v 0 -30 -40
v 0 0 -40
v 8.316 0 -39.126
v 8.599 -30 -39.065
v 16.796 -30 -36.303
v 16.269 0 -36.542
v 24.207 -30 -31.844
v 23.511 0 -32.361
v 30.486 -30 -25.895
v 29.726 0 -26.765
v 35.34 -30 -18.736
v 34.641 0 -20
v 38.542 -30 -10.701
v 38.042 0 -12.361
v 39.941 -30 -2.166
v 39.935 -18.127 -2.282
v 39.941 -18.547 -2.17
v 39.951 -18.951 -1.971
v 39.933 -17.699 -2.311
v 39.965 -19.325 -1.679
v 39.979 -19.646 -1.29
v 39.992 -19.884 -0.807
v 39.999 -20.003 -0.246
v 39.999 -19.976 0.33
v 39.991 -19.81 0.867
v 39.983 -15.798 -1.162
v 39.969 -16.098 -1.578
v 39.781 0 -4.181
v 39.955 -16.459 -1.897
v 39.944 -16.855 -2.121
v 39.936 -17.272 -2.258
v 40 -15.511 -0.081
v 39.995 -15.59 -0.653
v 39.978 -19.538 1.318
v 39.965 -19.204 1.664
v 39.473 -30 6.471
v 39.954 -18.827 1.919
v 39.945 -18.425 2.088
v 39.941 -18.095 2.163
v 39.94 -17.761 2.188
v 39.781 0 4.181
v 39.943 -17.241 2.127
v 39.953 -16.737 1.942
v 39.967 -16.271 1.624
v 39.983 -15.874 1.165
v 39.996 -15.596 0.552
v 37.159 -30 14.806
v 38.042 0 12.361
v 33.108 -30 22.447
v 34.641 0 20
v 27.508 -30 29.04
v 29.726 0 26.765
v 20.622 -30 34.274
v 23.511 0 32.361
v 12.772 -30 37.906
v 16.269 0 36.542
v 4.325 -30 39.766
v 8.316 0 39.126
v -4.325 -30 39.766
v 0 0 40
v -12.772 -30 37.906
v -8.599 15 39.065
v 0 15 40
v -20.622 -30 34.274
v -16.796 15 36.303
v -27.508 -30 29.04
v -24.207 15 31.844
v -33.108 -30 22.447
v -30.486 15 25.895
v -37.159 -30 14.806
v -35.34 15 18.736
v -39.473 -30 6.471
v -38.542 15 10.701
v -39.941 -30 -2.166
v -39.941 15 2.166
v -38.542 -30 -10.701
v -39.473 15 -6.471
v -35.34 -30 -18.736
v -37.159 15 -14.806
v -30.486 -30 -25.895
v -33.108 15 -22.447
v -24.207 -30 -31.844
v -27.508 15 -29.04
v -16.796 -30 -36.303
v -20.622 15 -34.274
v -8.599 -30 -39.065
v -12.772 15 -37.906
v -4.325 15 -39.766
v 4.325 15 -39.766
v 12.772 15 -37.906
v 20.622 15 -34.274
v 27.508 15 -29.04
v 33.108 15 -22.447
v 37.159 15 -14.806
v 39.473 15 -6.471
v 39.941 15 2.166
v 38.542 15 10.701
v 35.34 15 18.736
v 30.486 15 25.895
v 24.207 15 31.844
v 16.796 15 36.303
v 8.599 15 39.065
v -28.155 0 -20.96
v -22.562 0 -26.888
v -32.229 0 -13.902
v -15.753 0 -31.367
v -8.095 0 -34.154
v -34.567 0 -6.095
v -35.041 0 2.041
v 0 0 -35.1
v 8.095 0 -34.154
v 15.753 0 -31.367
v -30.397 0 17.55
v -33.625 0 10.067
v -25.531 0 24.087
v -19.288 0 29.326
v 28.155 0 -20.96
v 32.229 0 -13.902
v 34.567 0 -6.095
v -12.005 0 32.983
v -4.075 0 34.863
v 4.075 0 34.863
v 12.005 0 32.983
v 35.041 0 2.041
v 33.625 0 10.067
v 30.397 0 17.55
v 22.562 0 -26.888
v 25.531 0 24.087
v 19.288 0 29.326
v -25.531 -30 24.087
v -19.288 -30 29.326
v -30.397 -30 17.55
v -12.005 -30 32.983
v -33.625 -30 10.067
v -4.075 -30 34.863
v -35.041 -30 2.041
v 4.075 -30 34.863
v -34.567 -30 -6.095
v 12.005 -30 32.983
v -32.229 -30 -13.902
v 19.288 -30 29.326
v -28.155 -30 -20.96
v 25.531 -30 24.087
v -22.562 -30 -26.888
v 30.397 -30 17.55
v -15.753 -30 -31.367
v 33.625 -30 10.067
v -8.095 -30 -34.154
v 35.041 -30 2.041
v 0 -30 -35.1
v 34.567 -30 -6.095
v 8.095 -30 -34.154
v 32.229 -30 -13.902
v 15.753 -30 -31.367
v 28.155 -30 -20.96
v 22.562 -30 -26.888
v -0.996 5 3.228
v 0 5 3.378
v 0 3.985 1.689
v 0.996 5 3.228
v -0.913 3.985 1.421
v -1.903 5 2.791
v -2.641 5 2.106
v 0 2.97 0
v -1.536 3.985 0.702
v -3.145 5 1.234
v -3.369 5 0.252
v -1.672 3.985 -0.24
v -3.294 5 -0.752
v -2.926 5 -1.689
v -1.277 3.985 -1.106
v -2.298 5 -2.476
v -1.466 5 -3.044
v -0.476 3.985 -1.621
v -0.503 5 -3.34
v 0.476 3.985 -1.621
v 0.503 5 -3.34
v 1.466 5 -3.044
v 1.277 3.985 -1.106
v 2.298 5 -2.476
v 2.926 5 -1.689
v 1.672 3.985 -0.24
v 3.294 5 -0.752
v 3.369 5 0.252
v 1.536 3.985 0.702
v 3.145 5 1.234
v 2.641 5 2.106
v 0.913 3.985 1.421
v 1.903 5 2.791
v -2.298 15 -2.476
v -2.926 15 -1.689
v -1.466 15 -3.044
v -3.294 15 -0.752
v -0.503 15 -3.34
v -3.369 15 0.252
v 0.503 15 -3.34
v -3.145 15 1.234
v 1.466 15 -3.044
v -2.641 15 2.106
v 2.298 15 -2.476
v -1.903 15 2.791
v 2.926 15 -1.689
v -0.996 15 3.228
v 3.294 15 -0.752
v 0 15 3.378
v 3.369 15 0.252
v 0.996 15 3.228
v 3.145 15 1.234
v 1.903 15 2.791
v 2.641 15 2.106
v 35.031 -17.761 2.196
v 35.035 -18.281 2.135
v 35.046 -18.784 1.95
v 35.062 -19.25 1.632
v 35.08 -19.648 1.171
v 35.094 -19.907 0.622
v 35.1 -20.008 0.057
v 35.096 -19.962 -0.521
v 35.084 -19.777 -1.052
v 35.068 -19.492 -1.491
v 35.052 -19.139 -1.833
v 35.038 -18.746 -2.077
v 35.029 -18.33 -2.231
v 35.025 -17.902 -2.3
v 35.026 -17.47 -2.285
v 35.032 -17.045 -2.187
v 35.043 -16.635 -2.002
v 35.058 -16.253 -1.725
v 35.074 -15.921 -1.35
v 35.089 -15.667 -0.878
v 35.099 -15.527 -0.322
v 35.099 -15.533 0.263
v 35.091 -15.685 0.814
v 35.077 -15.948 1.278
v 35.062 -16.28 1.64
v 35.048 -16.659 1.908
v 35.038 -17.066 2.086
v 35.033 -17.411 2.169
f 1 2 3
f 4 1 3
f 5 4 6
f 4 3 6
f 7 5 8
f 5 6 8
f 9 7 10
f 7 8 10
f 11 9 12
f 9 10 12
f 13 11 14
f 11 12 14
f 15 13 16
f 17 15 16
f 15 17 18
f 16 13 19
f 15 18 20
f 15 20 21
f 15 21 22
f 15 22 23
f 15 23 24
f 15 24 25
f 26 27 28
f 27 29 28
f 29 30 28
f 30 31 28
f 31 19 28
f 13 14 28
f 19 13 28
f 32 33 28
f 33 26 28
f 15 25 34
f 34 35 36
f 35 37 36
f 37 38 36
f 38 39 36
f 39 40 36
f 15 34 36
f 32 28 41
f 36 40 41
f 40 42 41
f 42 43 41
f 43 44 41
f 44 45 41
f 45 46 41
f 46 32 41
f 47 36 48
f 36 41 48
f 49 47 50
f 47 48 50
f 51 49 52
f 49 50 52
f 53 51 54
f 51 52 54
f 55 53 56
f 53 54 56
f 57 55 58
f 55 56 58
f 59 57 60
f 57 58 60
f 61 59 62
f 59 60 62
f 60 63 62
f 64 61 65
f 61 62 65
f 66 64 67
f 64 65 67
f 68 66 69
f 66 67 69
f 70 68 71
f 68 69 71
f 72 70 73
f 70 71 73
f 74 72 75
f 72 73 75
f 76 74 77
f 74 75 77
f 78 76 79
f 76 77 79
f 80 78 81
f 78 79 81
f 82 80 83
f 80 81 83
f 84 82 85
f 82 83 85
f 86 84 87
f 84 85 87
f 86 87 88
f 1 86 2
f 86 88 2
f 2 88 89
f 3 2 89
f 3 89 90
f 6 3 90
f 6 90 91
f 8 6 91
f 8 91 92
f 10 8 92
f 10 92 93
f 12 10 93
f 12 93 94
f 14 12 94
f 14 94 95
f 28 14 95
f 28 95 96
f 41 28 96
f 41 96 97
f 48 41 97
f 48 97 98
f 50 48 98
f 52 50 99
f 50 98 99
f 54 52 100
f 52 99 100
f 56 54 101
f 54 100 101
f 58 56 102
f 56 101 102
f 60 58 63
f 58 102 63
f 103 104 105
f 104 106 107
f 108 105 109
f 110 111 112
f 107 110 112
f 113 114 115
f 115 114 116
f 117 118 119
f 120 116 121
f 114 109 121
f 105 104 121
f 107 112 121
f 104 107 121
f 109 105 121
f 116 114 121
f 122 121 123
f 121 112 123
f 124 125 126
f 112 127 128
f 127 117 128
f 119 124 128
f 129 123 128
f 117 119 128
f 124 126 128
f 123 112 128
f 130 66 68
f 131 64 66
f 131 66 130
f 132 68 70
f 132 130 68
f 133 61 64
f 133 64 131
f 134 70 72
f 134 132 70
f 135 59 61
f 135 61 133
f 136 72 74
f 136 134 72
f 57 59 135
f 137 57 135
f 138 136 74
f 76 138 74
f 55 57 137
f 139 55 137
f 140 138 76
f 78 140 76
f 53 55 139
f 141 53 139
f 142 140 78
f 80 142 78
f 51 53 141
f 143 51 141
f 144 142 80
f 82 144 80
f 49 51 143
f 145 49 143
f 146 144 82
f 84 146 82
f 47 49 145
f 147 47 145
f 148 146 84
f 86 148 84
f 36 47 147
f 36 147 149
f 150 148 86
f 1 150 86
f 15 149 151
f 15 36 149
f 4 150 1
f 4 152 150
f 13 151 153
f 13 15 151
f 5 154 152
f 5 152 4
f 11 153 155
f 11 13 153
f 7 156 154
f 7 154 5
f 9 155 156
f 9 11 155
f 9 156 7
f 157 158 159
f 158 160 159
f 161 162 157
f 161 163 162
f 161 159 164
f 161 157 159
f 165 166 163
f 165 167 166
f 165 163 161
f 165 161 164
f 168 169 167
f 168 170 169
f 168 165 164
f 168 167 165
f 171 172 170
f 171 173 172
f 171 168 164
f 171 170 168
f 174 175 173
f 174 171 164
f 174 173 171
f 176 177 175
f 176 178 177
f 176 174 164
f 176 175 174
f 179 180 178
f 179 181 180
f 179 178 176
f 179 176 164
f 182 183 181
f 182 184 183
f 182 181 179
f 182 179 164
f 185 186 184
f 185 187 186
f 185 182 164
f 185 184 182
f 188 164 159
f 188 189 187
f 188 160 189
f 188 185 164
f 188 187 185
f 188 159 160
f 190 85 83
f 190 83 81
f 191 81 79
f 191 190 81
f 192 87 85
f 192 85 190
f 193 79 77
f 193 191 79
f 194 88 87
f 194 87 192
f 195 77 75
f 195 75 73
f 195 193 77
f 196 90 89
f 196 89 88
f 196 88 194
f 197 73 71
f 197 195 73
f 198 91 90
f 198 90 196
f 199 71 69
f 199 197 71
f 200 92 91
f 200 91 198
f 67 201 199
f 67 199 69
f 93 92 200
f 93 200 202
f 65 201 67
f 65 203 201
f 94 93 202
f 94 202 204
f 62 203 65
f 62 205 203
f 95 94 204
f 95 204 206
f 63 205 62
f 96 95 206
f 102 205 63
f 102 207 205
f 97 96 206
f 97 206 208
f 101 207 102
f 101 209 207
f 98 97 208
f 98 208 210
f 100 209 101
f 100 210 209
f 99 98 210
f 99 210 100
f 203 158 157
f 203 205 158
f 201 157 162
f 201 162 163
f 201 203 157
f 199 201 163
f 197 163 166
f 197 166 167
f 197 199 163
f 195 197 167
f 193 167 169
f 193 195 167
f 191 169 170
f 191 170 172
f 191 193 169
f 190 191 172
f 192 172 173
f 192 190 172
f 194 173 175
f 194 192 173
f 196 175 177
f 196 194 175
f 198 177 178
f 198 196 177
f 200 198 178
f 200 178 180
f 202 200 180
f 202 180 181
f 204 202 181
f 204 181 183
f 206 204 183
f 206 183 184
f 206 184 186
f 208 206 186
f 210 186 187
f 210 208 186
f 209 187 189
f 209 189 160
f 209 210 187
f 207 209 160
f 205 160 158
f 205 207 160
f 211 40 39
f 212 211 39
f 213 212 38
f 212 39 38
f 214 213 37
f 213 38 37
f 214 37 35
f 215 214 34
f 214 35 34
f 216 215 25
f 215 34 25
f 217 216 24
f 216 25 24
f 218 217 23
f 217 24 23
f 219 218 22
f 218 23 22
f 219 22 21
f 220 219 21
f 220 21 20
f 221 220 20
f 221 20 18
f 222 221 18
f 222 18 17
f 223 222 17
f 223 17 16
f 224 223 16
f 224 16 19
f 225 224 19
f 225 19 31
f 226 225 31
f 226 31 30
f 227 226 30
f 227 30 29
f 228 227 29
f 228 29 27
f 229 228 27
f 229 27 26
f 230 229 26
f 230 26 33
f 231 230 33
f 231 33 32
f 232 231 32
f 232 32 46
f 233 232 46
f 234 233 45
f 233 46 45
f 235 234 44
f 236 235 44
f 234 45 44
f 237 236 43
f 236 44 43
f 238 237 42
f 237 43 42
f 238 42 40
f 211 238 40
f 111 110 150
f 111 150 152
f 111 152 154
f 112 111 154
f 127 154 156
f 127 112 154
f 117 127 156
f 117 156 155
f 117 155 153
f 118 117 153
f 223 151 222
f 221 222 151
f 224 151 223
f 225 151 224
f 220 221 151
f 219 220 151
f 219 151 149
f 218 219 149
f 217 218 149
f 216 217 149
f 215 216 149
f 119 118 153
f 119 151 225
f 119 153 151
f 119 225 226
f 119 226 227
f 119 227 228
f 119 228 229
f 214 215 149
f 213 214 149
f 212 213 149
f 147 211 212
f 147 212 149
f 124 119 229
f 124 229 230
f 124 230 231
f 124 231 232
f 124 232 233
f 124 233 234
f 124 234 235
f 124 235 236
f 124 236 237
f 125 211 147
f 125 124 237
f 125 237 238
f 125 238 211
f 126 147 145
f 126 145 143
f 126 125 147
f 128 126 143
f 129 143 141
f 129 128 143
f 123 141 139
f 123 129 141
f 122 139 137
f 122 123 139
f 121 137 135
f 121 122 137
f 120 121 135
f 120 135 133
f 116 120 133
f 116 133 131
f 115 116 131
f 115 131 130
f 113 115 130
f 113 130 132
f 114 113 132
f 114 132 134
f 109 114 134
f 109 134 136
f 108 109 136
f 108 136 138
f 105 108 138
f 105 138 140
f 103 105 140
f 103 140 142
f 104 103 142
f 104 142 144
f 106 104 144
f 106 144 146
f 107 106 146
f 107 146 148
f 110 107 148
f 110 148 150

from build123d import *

# Parameters (mm, degrees)
ESQUISSE1_R           = 40
BOSS_EXTRU_1_DEPTH    = 15
ESQUISSE5_R           = 40
ESQUISSE5_R_2         = 35.1
BOSS_EXTRU_2_DEPTH    = 30
D_GAGEMENT_M41_REACH  = 97.28
D_GAGEMENT_M41_BORE_R = 2.25


with BuildPart() as part:
    # Esquisse1 → Boss.-Extru.1 (new body)
    with BuildSketch(Plane(origin=(0, 0, 0), x_dir=(1, 0, 0), z_dir=(0, 1, 0))):
        with Locations(Location((0, 0, 0), (0, 0, 270))):
            Circle(ESQUISSE1_R)
    extrude(amount=BOSS_EXTRU_1_DEPTH)

    # Esquisse5 → Boss.-Extru.2 (add)
    with BuildSketch(Plane.XZ):
        with Locations(Location((0, 0, 0), (0, 0, 270))):
            Circle(ESQUISSE5_R)
        with Locations(Location((0, 0, 0), (0, 0, 270))):
            Circle(ESQUISSE5_R_2, mode=Mode.SUBTRACT)
    extrude(amount=BOSS_EXTRU_2_DEPTH)

    # Dégagement M41 bore (on position points) → Dégagement M41 (cut, up to next)
    with BuildSketch(Plane(origin=(39.999952301, -17.76077449, -0.061772988), x_dir=(0.0015443247, 0, 0.99999880753), z_dir=(0.99999880753, 0, -0.0015443247)), mode=Mode.PRIVATE) as d_gagement_m41_sk1:
        Circle(D_GAGEMENT_M41_BORE_R)
    d_gagement_m41_tool1 = extrude(d_gagement_m41_sk1.sketch, amount=-D_GAGEMENT_M41_REACH, mode=Mode.PRIVATE) & part.part
    add(d_gagement_m41_tool1.solids().sort_by_distance((39.999952, -17.760774, -0.061773))[0], mode=Mode.SUBTRACT)

    # Esquisse11 → Dégagement 1/41 (revolve, cut)
    with BuildSketch(Plane(origin=(0, 15, 0), x_dir=(0, 0, 1), z_dir=(1, 0, 0))):
        Polygon((0, 0), (0, 12.029827343), (3.3782, 10), (3.3782, 0), align=None)
    revolve(axis=Axis((0, 21.35, 0), (0, -1, 0)), mode=Mode.SUBTRACT)


solid = part.part
